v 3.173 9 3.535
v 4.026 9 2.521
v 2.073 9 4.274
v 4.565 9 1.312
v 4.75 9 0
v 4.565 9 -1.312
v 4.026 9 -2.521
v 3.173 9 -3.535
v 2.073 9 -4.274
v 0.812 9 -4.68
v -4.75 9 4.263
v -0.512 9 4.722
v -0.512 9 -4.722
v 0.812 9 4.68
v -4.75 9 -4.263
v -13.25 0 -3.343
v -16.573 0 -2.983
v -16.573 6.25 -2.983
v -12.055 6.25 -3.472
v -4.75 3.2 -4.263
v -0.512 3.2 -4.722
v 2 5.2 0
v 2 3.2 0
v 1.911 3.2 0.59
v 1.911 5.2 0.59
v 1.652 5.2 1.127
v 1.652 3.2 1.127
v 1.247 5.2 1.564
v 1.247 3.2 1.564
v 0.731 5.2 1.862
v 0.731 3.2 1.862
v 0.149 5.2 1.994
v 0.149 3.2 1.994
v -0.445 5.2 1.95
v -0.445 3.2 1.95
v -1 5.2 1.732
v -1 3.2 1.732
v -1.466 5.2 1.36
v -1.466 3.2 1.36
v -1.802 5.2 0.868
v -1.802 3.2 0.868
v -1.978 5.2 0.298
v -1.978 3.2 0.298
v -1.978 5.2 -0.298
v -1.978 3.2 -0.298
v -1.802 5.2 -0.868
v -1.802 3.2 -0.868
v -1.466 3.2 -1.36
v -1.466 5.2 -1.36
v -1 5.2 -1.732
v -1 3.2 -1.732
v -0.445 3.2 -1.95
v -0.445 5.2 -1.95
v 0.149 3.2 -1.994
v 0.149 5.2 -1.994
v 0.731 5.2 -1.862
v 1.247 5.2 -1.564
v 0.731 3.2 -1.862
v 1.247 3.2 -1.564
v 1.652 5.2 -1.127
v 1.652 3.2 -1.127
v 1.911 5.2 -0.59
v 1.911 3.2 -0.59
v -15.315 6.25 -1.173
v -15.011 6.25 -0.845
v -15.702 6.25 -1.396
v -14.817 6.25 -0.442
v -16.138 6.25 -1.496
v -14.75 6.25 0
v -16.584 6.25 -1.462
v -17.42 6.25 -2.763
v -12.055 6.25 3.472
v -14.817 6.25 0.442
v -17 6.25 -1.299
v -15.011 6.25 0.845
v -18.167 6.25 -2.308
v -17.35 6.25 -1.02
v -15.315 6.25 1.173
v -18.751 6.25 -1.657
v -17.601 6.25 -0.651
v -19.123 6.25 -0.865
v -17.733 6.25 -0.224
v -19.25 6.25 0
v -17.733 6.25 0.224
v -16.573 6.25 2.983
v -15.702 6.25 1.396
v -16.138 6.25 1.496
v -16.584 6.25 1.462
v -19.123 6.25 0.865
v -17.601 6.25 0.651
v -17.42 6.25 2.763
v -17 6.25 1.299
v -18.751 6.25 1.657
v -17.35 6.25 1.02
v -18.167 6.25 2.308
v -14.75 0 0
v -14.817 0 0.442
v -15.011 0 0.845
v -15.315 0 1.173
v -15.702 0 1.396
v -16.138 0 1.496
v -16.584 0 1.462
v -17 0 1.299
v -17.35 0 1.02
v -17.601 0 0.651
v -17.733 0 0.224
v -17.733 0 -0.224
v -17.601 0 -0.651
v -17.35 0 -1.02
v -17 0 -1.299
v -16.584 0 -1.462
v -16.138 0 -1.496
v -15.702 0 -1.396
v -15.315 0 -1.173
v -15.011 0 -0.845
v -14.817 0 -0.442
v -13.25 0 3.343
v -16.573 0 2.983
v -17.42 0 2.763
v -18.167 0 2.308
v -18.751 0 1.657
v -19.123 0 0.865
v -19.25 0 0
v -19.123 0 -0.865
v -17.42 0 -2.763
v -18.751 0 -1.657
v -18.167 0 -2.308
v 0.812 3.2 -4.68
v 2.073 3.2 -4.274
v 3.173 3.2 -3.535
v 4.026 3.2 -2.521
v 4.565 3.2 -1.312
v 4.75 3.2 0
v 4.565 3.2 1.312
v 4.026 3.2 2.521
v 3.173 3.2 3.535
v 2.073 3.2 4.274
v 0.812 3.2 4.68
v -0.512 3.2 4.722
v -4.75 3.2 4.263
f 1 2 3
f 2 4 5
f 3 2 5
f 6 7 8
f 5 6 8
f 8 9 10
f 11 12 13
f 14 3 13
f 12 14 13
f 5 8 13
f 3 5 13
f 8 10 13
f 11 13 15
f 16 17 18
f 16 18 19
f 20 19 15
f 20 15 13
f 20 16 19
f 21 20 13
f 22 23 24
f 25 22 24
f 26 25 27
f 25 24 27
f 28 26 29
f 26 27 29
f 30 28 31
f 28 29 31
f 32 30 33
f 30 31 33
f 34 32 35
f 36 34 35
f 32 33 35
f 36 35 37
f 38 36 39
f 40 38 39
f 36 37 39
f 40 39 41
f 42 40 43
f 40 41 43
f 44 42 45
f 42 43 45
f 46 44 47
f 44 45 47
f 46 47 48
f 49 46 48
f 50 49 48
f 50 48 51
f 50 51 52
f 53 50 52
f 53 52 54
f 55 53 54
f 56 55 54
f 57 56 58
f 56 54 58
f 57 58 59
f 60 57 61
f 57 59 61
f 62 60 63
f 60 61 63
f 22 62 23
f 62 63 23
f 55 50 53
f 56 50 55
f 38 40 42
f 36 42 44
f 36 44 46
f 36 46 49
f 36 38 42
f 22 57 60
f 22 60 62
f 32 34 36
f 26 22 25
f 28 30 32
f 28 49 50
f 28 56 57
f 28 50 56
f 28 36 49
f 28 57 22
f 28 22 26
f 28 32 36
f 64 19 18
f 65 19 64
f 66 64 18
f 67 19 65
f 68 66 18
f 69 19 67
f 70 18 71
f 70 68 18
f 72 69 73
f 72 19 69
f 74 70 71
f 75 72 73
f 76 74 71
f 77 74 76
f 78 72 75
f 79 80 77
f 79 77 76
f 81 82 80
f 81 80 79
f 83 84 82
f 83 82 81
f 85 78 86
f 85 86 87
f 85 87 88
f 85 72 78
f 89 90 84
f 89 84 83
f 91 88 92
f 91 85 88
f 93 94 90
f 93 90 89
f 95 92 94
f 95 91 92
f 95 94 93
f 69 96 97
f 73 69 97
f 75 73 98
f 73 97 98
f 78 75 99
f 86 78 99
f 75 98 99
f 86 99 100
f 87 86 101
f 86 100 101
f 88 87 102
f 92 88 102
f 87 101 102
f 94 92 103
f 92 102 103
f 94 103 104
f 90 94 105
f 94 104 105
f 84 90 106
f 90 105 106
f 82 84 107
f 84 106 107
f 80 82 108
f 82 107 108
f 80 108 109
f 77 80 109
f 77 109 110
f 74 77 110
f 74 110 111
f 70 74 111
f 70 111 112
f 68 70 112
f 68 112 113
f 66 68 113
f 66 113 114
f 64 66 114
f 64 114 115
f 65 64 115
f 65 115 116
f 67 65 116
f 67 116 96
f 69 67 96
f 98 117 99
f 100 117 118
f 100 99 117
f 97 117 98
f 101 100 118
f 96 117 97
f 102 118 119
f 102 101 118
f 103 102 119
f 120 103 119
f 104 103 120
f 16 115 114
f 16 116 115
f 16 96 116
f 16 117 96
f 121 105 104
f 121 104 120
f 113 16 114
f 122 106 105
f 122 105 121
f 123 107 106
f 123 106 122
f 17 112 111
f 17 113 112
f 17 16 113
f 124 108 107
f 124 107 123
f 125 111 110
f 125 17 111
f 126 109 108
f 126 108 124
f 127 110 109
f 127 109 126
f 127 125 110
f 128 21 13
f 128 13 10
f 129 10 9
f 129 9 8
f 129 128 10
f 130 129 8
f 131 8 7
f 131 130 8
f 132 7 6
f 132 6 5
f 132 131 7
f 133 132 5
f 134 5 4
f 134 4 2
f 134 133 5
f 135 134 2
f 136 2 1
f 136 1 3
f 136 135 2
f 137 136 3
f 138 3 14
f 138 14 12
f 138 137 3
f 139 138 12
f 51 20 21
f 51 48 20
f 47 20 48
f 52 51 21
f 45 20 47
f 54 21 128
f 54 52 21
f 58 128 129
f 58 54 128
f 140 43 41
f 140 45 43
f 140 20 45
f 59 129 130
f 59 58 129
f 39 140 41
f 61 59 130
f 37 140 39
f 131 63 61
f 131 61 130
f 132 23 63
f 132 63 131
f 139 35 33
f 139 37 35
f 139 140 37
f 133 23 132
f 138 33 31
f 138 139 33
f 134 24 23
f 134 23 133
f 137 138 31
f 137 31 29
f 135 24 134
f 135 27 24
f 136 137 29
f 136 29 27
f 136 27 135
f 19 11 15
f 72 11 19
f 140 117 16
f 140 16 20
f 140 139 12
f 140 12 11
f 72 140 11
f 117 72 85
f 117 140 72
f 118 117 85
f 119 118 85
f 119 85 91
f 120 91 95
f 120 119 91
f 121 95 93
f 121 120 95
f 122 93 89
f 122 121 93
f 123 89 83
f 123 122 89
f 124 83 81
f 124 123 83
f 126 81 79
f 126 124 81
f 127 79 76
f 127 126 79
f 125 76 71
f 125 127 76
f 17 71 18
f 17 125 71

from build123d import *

# Parameters (mm, degrees)
BOSS_EXTRUDE1_DEPTH     = 9
CUT_EXTRUDE1_DEPTH      = 5.75
CUT_EXTRUDE1_DEPTH_BACK = 5.75
SKETCH3_R               = 2
CUT_EXTRUDE2_DEPTH      = 2
SKETCH4_R               = 1.5
CUT_EXTRUDE3_DEPTH      = 10


with BuildPart() as part:
    # Sketch1 → Boss-Extrude1 (new body)
    with BuildSketch(Plane(origin=(0, 0, 0), x_dir=(1, 0, 0), z_dir=(0, 1, 0))):
        with BuildLine():
            Line((-16.573076923, 2.982552816), (-0.511538462, 4.722375292))
            ThreePointArc((-0.511538462, 4.722375292), (4.75, 0), (-0.511538462, -4.722375292))
            Line((-0.511538462, -4.722375292), (-16.573076923, -2.982552816))
            ThreePointArc((-16.573076923, -2.982552816), (-19.25, 0), (-16.573076923, 2.982552816))
        make_face()
    extrude(amount=BOSS_EXTRUDE1_DEPTH)

    # Sketch2 → Cut-Extrude1 (cut, two sides)
    with BuildSketch(Plane.XY) as cut_extrude1_sk:
        Polygon((-4.75, 9), (-12.0546875, 6.25), (-19.25, 6.25), (-19.25, 9), align=None)
        Polygon((-13.25, 0), (-4.75, 3.2), (4.75, 3.2), (4.75, 0), align=None)
    extrude(amount=CUT_EXTRUDE1_DEPTH, mode=Mode.SUBTRACT)
    extrude(cut_extrude1_sk.sketch, amount=-CUT_EXTRUDE1_DEPTH_BACK, mode=Mode.SUBTRACT)

    # Sketch3 → Cut-Extrude2 (cut)
    with BuildSketch(Plane.XZ.offset(-3.2)):
        Circle(SKETCH3_R)
    extrude(amount=-CUT_EXTRUDE2_DEPTH, mode=Mode.SUBTRACT)

    # Sketch4 → Cut-Extrude3 (cut, through all)
    with BuildSketch(Plane.XZ):
        with Locations((-16.25, 0)):
            Circle(SKETCH4_R)
    extrude(amount=-CUT_EXTRUDE3_DEPTH, mode=Mode.SUBTRACT)


solid = part.part
